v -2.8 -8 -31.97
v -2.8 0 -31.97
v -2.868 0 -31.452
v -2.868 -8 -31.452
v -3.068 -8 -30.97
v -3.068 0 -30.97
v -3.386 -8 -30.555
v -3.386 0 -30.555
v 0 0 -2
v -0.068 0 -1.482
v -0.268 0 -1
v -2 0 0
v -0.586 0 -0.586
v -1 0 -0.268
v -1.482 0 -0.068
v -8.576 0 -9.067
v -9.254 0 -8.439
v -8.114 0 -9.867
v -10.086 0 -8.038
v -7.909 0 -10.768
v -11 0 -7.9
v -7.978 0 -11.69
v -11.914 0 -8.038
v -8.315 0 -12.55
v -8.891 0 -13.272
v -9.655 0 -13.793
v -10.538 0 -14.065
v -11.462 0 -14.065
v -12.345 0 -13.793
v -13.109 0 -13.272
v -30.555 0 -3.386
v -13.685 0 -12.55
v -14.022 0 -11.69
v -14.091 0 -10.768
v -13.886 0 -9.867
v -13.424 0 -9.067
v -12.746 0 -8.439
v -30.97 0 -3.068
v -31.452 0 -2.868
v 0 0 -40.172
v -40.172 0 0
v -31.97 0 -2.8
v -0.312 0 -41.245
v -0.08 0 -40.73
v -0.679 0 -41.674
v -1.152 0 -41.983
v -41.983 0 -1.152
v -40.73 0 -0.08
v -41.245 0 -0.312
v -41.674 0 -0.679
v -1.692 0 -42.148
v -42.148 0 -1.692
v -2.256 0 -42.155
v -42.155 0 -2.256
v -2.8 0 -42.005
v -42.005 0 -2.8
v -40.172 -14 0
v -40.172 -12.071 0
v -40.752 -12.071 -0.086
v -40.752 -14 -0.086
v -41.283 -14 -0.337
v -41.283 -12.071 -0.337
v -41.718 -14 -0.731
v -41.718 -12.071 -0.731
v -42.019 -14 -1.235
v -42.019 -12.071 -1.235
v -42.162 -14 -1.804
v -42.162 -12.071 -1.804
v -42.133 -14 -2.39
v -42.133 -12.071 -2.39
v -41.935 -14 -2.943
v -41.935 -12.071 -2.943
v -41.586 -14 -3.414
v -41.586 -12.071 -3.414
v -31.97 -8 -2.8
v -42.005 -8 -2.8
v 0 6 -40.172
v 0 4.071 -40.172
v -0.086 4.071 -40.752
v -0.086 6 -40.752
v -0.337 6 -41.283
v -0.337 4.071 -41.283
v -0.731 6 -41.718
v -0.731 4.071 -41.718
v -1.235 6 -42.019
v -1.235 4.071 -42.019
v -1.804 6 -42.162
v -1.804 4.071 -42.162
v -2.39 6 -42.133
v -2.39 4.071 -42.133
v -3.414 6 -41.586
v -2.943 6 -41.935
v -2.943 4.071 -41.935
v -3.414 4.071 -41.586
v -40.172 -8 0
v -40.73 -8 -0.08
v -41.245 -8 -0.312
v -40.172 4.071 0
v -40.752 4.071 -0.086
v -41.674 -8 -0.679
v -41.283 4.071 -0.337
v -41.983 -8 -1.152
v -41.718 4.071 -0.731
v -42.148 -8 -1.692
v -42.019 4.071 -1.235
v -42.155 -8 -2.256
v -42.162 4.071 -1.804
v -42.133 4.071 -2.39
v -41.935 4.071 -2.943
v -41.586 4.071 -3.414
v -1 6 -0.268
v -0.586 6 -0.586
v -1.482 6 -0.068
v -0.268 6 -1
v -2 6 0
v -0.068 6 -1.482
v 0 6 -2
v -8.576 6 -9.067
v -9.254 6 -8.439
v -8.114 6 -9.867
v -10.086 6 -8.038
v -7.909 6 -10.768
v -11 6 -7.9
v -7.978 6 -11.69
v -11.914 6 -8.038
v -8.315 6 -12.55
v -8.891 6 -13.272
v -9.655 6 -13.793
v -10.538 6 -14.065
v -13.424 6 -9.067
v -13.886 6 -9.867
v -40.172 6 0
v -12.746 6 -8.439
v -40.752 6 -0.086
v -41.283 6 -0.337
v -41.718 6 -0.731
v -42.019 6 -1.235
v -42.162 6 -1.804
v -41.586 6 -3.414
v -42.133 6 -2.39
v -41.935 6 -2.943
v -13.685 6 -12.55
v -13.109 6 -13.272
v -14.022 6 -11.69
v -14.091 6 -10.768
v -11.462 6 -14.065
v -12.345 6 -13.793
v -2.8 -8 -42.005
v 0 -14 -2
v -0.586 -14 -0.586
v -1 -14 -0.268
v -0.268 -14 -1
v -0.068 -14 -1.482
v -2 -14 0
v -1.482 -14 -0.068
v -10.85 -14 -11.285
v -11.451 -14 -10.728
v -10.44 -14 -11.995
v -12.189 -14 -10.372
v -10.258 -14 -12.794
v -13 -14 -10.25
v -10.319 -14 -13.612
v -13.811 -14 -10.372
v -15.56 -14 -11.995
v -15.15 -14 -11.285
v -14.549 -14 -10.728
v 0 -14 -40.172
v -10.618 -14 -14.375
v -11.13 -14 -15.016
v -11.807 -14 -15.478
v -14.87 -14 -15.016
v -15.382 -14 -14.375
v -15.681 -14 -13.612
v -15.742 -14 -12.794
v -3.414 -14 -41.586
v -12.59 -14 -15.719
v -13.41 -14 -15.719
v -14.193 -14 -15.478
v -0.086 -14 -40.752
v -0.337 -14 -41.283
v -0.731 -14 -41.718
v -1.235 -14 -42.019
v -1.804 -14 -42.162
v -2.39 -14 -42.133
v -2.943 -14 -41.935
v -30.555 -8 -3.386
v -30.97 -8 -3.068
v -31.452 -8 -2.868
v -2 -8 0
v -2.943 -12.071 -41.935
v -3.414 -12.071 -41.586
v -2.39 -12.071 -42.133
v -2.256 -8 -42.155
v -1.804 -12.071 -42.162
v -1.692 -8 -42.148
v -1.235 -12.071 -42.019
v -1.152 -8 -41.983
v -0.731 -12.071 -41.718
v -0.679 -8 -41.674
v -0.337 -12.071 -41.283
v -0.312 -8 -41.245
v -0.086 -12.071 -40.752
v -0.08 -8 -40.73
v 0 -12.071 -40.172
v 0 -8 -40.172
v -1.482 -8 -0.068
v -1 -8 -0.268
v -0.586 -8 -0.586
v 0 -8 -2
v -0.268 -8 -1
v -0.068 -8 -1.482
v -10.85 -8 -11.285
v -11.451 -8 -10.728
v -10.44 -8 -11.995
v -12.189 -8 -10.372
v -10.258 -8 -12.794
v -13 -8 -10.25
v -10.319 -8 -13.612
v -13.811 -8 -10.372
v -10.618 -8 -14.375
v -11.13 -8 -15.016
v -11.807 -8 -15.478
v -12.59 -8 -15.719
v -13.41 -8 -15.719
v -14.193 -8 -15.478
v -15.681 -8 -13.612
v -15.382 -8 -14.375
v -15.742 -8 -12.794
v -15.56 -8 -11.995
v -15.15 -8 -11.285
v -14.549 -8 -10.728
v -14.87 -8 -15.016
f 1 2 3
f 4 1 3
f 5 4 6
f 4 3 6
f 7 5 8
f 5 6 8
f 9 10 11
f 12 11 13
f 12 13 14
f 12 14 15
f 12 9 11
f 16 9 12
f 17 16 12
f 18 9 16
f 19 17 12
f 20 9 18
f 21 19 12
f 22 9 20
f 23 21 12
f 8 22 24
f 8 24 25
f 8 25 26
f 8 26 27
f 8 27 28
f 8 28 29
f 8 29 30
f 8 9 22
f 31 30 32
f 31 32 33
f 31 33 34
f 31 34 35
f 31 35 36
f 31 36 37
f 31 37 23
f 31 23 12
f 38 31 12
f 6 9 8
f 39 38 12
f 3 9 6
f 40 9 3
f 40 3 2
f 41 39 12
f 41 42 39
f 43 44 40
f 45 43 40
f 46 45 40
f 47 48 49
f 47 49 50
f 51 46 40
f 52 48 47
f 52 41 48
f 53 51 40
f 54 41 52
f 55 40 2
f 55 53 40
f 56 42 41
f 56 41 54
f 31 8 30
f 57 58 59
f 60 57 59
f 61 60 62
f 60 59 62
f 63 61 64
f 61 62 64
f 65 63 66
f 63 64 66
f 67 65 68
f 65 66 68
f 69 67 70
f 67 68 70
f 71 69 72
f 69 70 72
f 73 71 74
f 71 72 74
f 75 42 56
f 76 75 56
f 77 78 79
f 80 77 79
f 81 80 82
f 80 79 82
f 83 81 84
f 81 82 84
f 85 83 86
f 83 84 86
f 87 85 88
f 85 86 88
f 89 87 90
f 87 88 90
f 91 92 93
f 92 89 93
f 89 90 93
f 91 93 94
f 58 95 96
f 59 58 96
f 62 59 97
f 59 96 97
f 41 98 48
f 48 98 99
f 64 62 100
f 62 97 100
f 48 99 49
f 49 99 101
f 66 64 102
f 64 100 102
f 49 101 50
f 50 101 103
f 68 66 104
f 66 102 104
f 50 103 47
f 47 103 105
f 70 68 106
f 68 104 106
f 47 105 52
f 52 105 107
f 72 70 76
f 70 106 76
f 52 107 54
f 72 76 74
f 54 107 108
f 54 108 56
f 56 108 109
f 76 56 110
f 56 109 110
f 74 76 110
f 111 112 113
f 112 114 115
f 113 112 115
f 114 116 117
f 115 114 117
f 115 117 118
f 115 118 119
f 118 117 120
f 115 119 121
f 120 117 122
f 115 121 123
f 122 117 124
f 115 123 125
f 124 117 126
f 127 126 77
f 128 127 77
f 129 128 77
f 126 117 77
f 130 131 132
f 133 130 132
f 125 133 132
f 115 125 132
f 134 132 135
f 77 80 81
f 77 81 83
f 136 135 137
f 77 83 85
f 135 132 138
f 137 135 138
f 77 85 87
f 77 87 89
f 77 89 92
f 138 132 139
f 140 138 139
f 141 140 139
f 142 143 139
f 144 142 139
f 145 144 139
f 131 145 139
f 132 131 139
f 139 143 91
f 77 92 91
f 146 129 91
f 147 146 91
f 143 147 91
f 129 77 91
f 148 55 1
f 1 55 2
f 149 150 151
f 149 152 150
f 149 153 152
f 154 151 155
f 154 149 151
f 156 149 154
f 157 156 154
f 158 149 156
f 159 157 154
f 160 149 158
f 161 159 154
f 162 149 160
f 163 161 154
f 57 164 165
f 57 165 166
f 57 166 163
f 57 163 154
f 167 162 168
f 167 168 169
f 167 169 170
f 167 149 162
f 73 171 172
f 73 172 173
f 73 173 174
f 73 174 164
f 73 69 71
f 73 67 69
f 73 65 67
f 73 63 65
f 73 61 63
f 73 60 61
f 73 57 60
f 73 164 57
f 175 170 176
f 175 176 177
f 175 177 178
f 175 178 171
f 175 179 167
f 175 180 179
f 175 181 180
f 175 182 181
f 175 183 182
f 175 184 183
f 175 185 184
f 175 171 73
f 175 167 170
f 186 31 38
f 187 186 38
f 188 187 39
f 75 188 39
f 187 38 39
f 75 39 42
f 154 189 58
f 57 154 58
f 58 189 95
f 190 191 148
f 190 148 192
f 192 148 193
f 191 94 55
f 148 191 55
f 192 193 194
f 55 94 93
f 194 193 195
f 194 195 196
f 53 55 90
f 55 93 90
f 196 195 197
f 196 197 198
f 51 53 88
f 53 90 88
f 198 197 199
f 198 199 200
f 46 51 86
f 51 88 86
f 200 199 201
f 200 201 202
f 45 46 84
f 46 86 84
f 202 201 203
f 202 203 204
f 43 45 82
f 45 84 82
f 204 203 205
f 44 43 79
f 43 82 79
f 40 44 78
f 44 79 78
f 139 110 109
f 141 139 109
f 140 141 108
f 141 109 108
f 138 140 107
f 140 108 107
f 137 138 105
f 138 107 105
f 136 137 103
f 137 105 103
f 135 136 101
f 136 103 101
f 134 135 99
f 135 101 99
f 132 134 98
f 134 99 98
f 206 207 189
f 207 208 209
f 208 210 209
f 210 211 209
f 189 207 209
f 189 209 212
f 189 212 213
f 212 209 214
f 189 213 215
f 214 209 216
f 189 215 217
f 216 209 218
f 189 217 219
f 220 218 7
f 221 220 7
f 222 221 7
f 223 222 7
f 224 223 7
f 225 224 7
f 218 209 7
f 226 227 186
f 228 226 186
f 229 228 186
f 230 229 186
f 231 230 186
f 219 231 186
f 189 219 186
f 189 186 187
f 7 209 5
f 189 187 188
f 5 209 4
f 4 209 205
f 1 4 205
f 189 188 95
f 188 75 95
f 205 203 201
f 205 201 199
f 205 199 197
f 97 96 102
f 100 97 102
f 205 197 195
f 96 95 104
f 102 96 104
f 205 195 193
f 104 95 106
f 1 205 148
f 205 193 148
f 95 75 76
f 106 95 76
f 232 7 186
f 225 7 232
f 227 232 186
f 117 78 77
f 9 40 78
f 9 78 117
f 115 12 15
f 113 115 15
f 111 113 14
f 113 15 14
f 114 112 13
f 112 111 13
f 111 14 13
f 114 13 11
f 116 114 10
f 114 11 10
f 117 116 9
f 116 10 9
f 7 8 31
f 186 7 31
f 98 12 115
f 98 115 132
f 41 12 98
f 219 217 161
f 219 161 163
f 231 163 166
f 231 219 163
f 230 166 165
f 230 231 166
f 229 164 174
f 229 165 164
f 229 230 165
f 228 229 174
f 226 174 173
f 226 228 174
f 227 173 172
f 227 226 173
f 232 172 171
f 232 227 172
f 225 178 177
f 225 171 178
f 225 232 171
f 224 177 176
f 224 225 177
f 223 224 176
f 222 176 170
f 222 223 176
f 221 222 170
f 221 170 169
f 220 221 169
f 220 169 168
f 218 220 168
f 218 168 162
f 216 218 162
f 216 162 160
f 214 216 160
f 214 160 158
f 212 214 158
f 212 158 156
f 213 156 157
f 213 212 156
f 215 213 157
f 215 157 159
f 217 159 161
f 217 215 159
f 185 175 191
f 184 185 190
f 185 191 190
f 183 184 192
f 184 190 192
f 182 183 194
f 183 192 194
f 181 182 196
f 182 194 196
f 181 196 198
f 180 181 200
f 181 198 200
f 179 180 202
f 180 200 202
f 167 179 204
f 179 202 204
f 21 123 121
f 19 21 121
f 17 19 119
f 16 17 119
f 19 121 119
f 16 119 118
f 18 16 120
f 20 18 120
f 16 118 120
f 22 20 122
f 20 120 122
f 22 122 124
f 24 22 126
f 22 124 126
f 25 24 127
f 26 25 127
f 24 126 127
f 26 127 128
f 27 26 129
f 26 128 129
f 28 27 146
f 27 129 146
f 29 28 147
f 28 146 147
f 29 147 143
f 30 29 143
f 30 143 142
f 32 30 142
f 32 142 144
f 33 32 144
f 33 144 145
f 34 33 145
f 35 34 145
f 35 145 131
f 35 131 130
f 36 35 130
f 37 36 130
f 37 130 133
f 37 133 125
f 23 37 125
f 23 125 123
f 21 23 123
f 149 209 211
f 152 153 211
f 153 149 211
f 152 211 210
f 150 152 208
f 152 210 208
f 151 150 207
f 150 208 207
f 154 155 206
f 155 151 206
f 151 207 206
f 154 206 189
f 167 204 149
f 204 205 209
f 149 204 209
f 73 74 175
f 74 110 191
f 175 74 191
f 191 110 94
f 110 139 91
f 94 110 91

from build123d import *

# Parameters (mm, degrees)
EXTRUDE_1_DEPTH          = 6
EXTRUDE_2_DEPTH          = 8
EXTRUDE_START            = -8
EXTRUDE_3_DEPTH          = 6
CUT_EXTRUDE_1_DEPTH      = 67.708320321
CUT_EXTRUDE_1_DEPTH_BACK = 8
SKETCH_3_R               = 2.75
FILLET_1_R               = 2
SKETCH_4_R               = 3.1
CUT_EXTRUDE_2_DEPTH      = 7


with BuildPart() as part:
    # 草图1 → 凸台-拉伸1 (new body)
    with BuildSketch(Plane(origin=(0, 0, 0), x_dir=(1, 0, 0), z_dir=(0, 1, 0))):
        Polygon((0, 0), (-45, 0), (0, 45), align=None)
    extrude(amount=EXTRUDE_1_DEPTH)

    # 草图2 → 凸台-拉伸2 (add)
    with BuildSketch(Plane.XZ):
        Polygon((-2.8, -42.2), (-2.8, -31.141125497), (-31.141125497, -2.8), (-42.2, -2.8), align=None)
    extrude(amount=EXTRUDE_2_DEPTH)

    # 草图1<3> → 凸台-拉伸3 (add)
    with BuildSketch(Plane(origin=(0, 0, 0), x_dir=(1, 0, 0), z_dir=(0, 1, 0)).offset(EXTRUDE_START)):
        Polygon((0, 0), (-45, 0), (0, 45), align=None)
    extrude(amount=-EXTRUDE_3_DEPTH)

    # 草图3 → 切除-拉伸1 (cut, two sides: drawn at the far end of the back side and taken through both)
    with BuildSketch(Plane.XZ.offset(14).offset(-CUT_EXTRUDE_1_DEPTH_BACK)):
        with Locations(Location((-13, -13, 0), (0, 0, 90))):
            Circle(SKETCH_3_R)
    extrude(amount=CUT_EXTRUDE_1_DEPTH + CUT_EXTRUDE_1_DEPTH_BACK, mode=Mode.SUBTRACT)

    # 圆角1
    # the kernel refuses this fillet: 2 mm, written as the material it takes off along each edge
    with BuildSketch(Plane(origin=(-2.8, 0, -31.141125497), x_dir=(0, 0, -1), z_dir=(0, -1, 0))) as fillet_1_piece_1:
        with BuildLine():
            CenterArc((FILLET_1_R * 0.414213562373, -FILLET_1_R), FILLET_1_R, 90, 45)
            Line((-FILLET_1_R * 0.292893218813, -FILLET_1_R * 0.292893218813), (0, 0))
            Line((0, 0), (FILLET_1_R * 0.414213562373, 0))
        make_face()
    extrude(amount=8, mode=Mode.SUBTRACT)
    with BuildSketch(Plane(origin=(-31.141125497, 0, -2.8), x_dir=(-1, 0, 0), z_dir=(0, -1, 0))) as fillet_1_piece_2:
        with BuildLine():
            CenterArc((FILLET_1_R * 0.414213562373, FILLET_1_R), FILLET_1_R, 225, 45)
            Line((-FILLET_1_R * 0.292893218813, FILLET_1_R * 0.292893218813), (0, 0))
            Line((0, 0), (FILLET_1_R * 0.414213562373, 0))
        make_face()
    extrude(amount=8, mode=Mode.SUBTRACT)
    with BuildSketch(Plane(origin=(-45, 4.071067812, 0), x_dir=(1, 0, 0), z_dir=(0, -1, 0)), Plane(origin=(-45, -12.071067812, 0), x_dir=(0.7071067811865471, 0, -0.7071067811865478), z_dir=(0, 1, 0))) as fillet_1_piece_3:
        with BuildLine():
            CenterArc((FILLET_1_R * 2.41421356237, -FILLET_1_R), FILLET_1_R, 90, 135)
            Line((FILLET_1_R * 1.70710678119, -FILLET_1_R * 1.70710678119), (0, 0))
            Line((0, 0), (FILLET_1_R * 2.41421356237, 0))
        make_face()
    extrude(amount=30.142135624, mode=Mode.SUBTRACT)
    with BuildSketch(Plane(origin=(0, 4.071067812, -45), x_dir=(0, 0, 1), z_dir=(0, -1, 0)), Plane(origin=(0, -12.071067812, -45), x_dir=(-0.7071067811865477, 0, 0.7071067811865474), z_dir=(0, 1, 0))) as fillet_1_piece_4:
        with BuildLine():
            CenterArc((FILLET_1_R * 2.41421356237, FILLET_1_R), FILLET_1_R, 135, 135)
            Line((FILLET_1_R * 1.70710678119, FILLET_1_R * 1.70710678119), (0, 0))
            Line((0, 0), (FILLET_1_R * 2.41421356237, 0))
        make_face()
    extrude(amount=30.142135624, mode=Mode.SUBTRACT)
    with BuildSketch(Plane(origin=(0, -3, 0), x_dir=(-1, 0, 0), z_dir=(0, -1, 0)), Plane(origin=(0, -5, 0), x_dir=(0, 0, -1), z_dir=(0, 1, 0))) as fillet_1_piece_5:
        with BuildLine():
            CenterArc((FILLET_1_R, FILLET_1_R), FILLET_1_R, 180, 90)
            Line((0, FILLET_1_R), (0, 0))
            Line((0, 0), (FILLET_1_R, 0))
        make_face()
    extrude(amount=16, mode=Mode.SUBTRACT)

    # 草图4 → 切除-拉伸2 (cut)
    with BuildSketch(Plane(origin=(0, 6, 0), x_dir=(1, 0, 0), z_dir=(0, 1, 0))):
        with Locations(Location((-11, 11, 0), (0, 0, 270))):
            Circle(SKETCH_4_R)
    extrude(amount=-CUT_EXTRUDE_2_DEPTH, mode=Mode.SUBTRACT)


solid = part.part
